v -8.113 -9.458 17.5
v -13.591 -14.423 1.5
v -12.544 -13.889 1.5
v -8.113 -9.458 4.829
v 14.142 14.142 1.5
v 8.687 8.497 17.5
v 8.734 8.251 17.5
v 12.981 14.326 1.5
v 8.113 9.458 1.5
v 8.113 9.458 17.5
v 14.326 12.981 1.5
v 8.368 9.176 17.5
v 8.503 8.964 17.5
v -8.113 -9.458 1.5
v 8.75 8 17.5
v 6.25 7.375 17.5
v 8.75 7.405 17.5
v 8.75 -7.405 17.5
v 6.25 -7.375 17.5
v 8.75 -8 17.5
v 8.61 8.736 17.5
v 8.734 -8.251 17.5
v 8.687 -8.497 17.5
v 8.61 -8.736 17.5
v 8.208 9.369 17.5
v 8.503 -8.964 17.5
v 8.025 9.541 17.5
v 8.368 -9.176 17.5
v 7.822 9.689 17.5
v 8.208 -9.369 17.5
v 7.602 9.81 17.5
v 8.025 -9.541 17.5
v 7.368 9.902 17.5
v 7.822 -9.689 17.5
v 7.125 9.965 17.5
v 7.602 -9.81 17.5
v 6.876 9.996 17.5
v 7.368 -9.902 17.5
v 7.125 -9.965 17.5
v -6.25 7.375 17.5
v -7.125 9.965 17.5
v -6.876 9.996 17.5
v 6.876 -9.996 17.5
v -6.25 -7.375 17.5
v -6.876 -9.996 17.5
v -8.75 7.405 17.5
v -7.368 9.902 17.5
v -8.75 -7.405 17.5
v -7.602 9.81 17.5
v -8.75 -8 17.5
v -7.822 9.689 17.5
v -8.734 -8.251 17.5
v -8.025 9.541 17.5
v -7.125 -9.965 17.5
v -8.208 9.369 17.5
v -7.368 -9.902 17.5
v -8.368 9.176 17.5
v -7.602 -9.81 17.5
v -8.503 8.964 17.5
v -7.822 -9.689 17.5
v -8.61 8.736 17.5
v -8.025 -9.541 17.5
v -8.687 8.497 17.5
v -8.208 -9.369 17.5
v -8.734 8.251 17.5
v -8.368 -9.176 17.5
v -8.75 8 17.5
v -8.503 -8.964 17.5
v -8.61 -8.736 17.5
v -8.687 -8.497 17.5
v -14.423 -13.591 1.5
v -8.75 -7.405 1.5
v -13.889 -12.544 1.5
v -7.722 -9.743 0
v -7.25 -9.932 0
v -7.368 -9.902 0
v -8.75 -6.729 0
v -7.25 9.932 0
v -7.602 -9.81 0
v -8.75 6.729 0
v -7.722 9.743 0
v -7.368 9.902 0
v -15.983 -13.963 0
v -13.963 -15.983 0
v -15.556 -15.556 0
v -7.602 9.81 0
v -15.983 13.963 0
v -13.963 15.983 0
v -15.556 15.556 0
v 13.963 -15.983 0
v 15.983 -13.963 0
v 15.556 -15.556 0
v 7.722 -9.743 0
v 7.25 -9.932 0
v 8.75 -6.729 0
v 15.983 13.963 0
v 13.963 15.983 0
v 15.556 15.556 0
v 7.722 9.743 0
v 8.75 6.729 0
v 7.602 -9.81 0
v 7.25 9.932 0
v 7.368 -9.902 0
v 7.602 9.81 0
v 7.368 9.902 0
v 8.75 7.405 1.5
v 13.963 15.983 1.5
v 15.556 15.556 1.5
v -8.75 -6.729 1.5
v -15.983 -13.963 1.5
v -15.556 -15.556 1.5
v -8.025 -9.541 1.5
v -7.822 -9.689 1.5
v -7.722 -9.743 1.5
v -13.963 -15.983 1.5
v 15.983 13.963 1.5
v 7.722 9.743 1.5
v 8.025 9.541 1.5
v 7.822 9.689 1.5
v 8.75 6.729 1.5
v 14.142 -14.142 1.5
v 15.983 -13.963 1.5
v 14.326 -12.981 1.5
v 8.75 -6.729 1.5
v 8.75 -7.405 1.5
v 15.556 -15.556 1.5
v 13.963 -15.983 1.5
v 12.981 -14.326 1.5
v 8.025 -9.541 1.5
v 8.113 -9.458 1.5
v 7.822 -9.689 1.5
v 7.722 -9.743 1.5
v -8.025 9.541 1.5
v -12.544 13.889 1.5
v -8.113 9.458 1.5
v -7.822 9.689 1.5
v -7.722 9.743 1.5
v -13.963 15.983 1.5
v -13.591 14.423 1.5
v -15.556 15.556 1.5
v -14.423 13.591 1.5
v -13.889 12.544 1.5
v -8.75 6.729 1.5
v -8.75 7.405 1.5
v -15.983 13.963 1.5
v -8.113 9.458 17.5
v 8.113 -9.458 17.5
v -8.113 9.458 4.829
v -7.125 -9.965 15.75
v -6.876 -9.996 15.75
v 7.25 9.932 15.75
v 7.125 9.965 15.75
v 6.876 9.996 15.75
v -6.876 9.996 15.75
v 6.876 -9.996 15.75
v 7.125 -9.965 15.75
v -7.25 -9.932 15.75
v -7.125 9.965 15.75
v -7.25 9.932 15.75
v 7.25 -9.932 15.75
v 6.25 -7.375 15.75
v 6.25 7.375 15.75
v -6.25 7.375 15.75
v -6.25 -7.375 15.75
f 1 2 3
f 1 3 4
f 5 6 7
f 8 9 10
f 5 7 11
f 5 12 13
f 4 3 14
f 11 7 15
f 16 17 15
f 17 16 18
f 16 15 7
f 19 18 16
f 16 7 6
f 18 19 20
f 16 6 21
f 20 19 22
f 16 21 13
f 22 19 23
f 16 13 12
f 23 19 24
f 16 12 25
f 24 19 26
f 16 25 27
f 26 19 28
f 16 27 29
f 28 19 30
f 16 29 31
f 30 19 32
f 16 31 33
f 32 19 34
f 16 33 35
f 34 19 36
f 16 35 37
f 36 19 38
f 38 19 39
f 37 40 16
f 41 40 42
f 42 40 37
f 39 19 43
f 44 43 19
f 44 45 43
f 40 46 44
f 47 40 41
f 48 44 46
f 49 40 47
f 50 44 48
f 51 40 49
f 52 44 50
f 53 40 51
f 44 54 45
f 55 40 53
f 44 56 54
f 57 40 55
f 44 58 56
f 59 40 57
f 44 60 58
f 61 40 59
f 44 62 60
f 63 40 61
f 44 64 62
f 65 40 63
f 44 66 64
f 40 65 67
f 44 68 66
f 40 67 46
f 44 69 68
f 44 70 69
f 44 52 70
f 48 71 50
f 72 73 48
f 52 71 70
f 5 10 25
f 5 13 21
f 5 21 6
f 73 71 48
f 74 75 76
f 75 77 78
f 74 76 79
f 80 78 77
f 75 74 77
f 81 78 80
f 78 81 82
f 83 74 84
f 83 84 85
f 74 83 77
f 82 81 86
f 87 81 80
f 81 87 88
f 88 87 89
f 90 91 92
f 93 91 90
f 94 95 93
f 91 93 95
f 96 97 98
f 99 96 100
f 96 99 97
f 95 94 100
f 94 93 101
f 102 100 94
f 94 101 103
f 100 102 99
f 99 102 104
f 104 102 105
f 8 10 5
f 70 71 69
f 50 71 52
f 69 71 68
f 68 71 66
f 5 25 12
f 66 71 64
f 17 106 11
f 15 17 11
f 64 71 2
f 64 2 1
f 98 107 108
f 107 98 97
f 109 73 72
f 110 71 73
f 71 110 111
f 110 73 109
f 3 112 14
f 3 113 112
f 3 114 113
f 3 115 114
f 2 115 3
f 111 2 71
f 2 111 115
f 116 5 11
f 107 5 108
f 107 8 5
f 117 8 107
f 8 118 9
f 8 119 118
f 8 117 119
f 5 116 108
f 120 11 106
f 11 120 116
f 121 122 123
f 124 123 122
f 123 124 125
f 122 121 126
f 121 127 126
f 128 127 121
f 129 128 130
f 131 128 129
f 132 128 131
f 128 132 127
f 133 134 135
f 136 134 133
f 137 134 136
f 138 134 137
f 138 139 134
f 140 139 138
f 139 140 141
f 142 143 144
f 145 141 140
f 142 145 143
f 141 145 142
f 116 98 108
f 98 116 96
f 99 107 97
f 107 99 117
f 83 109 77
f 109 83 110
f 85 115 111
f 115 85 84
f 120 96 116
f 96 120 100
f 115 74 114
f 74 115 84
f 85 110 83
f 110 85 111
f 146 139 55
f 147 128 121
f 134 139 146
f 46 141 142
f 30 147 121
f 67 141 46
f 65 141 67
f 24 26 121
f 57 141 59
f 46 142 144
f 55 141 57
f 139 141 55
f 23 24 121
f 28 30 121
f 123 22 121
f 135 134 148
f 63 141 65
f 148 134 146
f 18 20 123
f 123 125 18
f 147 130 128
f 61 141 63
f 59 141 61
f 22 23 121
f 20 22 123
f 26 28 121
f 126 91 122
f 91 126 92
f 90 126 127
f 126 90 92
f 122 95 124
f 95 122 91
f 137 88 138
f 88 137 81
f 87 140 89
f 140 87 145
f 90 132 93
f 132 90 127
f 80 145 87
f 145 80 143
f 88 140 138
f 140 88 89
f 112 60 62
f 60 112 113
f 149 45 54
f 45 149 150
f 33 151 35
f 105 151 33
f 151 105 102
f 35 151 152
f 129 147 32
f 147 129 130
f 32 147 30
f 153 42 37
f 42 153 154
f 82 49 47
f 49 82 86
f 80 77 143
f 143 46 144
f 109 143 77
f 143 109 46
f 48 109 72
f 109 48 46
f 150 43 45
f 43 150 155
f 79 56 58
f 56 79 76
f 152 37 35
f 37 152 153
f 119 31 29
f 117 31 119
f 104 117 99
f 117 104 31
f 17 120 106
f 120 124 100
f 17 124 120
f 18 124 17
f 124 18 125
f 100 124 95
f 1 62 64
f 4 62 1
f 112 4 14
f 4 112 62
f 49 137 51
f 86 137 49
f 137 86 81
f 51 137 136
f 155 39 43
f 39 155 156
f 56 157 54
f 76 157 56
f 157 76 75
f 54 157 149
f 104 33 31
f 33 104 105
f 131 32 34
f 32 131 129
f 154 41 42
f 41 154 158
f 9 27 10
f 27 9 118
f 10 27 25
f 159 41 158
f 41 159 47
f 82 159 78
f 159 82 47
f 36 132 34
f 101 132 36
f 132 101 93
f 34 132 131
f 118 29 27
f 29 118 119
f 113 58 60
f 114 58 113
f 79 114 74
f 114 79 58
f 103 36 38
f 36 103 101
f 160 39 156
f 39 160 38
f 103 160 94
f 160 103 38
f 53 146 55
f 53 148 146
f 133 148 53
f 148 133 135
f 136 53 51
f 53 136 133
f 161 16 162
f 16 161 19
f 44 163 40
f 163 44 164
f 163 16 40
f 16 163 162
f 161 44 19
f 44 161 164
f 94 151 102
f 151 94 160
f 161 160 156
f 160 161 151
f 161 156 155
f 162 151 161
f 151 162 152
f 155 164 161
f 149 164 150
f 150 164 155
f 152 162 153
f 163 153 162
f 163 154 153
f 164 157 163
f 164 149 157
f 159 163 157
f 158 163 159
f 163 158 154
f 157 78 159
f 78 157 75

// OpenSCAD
// edit battery height & width 
battery_height=24.5;
battery_width=14.5;


// Adjust height for Moskito Frame & part thickness
full_height=battery_height-10+2;

difference(){
    union() {

        hull(){
        intersection(){
            hull(){
                $fn=50;
               translate([0,0,full_height/2])
                minkowski()
                {
                    cube([battery_width-1,20-4,full_height],center=true);
                    cylinder(r=2,h=1);
                }
            }
            hull(){
                   rotate([0,0,45])translate([3.3/2-44/2,0,0])foot_base(2,1,44);
                   rotate([0,0,45])translate([3.3/2-44/2,0,full_height-0.5])foot_base(2,1.5,44);
            }
        }
         rotate([0,0,45])translate([2/2-(44-4)/2,0,0])foot_base(2,1.5,44-4);
        }

        rotate([0,0,45])translate([3.3/2-44/2,0,0])foot_base(3.3,1.5,44);


        hull(){
            intersection(){
                hull(){
                    $fn=50;
                   translate([0,0,full_height/2])
                    minkowski()
                    {
                        cube([battery_width-1,20-4,full_height],center=true);
                        cylinder(r=2,h=1);
                    }
                }
                hull(){
                       rotate([0,0,-45])translate([3.3/2-44/2,0,0])foot_base(2,1,44);
                       rotate([0,0,-45])translate([3.3/2-44/2,0,full_height-0.5])foot_base(2,1.5,44);
                }
            }
             rotate([0,0,-45])translate([2/2-(44-4)/2,0,0])foot_base(2,1.5,44-4);
        }

        rotate([0,0,-45])translate([3.3/2-44/2,0,0])foot_base(3.3,1.5,44);


        hull(){
            $fn=50;
           translate([0,0,full_height/2])
            minkowski()
            {
                cube([battery_width-1,20-4,full_height],center=true);
                cylinder(r=2,h=1);
            }
        }
    }
    cube([battery_width-2,20-4-2.5/2,full_height*3],center=true);
    cube([battery_width,20*2,(full_height-1.5/2)*2],center=true);
}    


module foot_base(width, height, length){
        translate([0,0,height/2])hull(){
            cylinder(d=width,h=height,center=true);
             translate([(length-width)/2,0,0])cylinder(d=width,h=height,center=true);
            translate([(length-width),0,0])cylinder(d=width,h=height,center=true);
        }
    }
